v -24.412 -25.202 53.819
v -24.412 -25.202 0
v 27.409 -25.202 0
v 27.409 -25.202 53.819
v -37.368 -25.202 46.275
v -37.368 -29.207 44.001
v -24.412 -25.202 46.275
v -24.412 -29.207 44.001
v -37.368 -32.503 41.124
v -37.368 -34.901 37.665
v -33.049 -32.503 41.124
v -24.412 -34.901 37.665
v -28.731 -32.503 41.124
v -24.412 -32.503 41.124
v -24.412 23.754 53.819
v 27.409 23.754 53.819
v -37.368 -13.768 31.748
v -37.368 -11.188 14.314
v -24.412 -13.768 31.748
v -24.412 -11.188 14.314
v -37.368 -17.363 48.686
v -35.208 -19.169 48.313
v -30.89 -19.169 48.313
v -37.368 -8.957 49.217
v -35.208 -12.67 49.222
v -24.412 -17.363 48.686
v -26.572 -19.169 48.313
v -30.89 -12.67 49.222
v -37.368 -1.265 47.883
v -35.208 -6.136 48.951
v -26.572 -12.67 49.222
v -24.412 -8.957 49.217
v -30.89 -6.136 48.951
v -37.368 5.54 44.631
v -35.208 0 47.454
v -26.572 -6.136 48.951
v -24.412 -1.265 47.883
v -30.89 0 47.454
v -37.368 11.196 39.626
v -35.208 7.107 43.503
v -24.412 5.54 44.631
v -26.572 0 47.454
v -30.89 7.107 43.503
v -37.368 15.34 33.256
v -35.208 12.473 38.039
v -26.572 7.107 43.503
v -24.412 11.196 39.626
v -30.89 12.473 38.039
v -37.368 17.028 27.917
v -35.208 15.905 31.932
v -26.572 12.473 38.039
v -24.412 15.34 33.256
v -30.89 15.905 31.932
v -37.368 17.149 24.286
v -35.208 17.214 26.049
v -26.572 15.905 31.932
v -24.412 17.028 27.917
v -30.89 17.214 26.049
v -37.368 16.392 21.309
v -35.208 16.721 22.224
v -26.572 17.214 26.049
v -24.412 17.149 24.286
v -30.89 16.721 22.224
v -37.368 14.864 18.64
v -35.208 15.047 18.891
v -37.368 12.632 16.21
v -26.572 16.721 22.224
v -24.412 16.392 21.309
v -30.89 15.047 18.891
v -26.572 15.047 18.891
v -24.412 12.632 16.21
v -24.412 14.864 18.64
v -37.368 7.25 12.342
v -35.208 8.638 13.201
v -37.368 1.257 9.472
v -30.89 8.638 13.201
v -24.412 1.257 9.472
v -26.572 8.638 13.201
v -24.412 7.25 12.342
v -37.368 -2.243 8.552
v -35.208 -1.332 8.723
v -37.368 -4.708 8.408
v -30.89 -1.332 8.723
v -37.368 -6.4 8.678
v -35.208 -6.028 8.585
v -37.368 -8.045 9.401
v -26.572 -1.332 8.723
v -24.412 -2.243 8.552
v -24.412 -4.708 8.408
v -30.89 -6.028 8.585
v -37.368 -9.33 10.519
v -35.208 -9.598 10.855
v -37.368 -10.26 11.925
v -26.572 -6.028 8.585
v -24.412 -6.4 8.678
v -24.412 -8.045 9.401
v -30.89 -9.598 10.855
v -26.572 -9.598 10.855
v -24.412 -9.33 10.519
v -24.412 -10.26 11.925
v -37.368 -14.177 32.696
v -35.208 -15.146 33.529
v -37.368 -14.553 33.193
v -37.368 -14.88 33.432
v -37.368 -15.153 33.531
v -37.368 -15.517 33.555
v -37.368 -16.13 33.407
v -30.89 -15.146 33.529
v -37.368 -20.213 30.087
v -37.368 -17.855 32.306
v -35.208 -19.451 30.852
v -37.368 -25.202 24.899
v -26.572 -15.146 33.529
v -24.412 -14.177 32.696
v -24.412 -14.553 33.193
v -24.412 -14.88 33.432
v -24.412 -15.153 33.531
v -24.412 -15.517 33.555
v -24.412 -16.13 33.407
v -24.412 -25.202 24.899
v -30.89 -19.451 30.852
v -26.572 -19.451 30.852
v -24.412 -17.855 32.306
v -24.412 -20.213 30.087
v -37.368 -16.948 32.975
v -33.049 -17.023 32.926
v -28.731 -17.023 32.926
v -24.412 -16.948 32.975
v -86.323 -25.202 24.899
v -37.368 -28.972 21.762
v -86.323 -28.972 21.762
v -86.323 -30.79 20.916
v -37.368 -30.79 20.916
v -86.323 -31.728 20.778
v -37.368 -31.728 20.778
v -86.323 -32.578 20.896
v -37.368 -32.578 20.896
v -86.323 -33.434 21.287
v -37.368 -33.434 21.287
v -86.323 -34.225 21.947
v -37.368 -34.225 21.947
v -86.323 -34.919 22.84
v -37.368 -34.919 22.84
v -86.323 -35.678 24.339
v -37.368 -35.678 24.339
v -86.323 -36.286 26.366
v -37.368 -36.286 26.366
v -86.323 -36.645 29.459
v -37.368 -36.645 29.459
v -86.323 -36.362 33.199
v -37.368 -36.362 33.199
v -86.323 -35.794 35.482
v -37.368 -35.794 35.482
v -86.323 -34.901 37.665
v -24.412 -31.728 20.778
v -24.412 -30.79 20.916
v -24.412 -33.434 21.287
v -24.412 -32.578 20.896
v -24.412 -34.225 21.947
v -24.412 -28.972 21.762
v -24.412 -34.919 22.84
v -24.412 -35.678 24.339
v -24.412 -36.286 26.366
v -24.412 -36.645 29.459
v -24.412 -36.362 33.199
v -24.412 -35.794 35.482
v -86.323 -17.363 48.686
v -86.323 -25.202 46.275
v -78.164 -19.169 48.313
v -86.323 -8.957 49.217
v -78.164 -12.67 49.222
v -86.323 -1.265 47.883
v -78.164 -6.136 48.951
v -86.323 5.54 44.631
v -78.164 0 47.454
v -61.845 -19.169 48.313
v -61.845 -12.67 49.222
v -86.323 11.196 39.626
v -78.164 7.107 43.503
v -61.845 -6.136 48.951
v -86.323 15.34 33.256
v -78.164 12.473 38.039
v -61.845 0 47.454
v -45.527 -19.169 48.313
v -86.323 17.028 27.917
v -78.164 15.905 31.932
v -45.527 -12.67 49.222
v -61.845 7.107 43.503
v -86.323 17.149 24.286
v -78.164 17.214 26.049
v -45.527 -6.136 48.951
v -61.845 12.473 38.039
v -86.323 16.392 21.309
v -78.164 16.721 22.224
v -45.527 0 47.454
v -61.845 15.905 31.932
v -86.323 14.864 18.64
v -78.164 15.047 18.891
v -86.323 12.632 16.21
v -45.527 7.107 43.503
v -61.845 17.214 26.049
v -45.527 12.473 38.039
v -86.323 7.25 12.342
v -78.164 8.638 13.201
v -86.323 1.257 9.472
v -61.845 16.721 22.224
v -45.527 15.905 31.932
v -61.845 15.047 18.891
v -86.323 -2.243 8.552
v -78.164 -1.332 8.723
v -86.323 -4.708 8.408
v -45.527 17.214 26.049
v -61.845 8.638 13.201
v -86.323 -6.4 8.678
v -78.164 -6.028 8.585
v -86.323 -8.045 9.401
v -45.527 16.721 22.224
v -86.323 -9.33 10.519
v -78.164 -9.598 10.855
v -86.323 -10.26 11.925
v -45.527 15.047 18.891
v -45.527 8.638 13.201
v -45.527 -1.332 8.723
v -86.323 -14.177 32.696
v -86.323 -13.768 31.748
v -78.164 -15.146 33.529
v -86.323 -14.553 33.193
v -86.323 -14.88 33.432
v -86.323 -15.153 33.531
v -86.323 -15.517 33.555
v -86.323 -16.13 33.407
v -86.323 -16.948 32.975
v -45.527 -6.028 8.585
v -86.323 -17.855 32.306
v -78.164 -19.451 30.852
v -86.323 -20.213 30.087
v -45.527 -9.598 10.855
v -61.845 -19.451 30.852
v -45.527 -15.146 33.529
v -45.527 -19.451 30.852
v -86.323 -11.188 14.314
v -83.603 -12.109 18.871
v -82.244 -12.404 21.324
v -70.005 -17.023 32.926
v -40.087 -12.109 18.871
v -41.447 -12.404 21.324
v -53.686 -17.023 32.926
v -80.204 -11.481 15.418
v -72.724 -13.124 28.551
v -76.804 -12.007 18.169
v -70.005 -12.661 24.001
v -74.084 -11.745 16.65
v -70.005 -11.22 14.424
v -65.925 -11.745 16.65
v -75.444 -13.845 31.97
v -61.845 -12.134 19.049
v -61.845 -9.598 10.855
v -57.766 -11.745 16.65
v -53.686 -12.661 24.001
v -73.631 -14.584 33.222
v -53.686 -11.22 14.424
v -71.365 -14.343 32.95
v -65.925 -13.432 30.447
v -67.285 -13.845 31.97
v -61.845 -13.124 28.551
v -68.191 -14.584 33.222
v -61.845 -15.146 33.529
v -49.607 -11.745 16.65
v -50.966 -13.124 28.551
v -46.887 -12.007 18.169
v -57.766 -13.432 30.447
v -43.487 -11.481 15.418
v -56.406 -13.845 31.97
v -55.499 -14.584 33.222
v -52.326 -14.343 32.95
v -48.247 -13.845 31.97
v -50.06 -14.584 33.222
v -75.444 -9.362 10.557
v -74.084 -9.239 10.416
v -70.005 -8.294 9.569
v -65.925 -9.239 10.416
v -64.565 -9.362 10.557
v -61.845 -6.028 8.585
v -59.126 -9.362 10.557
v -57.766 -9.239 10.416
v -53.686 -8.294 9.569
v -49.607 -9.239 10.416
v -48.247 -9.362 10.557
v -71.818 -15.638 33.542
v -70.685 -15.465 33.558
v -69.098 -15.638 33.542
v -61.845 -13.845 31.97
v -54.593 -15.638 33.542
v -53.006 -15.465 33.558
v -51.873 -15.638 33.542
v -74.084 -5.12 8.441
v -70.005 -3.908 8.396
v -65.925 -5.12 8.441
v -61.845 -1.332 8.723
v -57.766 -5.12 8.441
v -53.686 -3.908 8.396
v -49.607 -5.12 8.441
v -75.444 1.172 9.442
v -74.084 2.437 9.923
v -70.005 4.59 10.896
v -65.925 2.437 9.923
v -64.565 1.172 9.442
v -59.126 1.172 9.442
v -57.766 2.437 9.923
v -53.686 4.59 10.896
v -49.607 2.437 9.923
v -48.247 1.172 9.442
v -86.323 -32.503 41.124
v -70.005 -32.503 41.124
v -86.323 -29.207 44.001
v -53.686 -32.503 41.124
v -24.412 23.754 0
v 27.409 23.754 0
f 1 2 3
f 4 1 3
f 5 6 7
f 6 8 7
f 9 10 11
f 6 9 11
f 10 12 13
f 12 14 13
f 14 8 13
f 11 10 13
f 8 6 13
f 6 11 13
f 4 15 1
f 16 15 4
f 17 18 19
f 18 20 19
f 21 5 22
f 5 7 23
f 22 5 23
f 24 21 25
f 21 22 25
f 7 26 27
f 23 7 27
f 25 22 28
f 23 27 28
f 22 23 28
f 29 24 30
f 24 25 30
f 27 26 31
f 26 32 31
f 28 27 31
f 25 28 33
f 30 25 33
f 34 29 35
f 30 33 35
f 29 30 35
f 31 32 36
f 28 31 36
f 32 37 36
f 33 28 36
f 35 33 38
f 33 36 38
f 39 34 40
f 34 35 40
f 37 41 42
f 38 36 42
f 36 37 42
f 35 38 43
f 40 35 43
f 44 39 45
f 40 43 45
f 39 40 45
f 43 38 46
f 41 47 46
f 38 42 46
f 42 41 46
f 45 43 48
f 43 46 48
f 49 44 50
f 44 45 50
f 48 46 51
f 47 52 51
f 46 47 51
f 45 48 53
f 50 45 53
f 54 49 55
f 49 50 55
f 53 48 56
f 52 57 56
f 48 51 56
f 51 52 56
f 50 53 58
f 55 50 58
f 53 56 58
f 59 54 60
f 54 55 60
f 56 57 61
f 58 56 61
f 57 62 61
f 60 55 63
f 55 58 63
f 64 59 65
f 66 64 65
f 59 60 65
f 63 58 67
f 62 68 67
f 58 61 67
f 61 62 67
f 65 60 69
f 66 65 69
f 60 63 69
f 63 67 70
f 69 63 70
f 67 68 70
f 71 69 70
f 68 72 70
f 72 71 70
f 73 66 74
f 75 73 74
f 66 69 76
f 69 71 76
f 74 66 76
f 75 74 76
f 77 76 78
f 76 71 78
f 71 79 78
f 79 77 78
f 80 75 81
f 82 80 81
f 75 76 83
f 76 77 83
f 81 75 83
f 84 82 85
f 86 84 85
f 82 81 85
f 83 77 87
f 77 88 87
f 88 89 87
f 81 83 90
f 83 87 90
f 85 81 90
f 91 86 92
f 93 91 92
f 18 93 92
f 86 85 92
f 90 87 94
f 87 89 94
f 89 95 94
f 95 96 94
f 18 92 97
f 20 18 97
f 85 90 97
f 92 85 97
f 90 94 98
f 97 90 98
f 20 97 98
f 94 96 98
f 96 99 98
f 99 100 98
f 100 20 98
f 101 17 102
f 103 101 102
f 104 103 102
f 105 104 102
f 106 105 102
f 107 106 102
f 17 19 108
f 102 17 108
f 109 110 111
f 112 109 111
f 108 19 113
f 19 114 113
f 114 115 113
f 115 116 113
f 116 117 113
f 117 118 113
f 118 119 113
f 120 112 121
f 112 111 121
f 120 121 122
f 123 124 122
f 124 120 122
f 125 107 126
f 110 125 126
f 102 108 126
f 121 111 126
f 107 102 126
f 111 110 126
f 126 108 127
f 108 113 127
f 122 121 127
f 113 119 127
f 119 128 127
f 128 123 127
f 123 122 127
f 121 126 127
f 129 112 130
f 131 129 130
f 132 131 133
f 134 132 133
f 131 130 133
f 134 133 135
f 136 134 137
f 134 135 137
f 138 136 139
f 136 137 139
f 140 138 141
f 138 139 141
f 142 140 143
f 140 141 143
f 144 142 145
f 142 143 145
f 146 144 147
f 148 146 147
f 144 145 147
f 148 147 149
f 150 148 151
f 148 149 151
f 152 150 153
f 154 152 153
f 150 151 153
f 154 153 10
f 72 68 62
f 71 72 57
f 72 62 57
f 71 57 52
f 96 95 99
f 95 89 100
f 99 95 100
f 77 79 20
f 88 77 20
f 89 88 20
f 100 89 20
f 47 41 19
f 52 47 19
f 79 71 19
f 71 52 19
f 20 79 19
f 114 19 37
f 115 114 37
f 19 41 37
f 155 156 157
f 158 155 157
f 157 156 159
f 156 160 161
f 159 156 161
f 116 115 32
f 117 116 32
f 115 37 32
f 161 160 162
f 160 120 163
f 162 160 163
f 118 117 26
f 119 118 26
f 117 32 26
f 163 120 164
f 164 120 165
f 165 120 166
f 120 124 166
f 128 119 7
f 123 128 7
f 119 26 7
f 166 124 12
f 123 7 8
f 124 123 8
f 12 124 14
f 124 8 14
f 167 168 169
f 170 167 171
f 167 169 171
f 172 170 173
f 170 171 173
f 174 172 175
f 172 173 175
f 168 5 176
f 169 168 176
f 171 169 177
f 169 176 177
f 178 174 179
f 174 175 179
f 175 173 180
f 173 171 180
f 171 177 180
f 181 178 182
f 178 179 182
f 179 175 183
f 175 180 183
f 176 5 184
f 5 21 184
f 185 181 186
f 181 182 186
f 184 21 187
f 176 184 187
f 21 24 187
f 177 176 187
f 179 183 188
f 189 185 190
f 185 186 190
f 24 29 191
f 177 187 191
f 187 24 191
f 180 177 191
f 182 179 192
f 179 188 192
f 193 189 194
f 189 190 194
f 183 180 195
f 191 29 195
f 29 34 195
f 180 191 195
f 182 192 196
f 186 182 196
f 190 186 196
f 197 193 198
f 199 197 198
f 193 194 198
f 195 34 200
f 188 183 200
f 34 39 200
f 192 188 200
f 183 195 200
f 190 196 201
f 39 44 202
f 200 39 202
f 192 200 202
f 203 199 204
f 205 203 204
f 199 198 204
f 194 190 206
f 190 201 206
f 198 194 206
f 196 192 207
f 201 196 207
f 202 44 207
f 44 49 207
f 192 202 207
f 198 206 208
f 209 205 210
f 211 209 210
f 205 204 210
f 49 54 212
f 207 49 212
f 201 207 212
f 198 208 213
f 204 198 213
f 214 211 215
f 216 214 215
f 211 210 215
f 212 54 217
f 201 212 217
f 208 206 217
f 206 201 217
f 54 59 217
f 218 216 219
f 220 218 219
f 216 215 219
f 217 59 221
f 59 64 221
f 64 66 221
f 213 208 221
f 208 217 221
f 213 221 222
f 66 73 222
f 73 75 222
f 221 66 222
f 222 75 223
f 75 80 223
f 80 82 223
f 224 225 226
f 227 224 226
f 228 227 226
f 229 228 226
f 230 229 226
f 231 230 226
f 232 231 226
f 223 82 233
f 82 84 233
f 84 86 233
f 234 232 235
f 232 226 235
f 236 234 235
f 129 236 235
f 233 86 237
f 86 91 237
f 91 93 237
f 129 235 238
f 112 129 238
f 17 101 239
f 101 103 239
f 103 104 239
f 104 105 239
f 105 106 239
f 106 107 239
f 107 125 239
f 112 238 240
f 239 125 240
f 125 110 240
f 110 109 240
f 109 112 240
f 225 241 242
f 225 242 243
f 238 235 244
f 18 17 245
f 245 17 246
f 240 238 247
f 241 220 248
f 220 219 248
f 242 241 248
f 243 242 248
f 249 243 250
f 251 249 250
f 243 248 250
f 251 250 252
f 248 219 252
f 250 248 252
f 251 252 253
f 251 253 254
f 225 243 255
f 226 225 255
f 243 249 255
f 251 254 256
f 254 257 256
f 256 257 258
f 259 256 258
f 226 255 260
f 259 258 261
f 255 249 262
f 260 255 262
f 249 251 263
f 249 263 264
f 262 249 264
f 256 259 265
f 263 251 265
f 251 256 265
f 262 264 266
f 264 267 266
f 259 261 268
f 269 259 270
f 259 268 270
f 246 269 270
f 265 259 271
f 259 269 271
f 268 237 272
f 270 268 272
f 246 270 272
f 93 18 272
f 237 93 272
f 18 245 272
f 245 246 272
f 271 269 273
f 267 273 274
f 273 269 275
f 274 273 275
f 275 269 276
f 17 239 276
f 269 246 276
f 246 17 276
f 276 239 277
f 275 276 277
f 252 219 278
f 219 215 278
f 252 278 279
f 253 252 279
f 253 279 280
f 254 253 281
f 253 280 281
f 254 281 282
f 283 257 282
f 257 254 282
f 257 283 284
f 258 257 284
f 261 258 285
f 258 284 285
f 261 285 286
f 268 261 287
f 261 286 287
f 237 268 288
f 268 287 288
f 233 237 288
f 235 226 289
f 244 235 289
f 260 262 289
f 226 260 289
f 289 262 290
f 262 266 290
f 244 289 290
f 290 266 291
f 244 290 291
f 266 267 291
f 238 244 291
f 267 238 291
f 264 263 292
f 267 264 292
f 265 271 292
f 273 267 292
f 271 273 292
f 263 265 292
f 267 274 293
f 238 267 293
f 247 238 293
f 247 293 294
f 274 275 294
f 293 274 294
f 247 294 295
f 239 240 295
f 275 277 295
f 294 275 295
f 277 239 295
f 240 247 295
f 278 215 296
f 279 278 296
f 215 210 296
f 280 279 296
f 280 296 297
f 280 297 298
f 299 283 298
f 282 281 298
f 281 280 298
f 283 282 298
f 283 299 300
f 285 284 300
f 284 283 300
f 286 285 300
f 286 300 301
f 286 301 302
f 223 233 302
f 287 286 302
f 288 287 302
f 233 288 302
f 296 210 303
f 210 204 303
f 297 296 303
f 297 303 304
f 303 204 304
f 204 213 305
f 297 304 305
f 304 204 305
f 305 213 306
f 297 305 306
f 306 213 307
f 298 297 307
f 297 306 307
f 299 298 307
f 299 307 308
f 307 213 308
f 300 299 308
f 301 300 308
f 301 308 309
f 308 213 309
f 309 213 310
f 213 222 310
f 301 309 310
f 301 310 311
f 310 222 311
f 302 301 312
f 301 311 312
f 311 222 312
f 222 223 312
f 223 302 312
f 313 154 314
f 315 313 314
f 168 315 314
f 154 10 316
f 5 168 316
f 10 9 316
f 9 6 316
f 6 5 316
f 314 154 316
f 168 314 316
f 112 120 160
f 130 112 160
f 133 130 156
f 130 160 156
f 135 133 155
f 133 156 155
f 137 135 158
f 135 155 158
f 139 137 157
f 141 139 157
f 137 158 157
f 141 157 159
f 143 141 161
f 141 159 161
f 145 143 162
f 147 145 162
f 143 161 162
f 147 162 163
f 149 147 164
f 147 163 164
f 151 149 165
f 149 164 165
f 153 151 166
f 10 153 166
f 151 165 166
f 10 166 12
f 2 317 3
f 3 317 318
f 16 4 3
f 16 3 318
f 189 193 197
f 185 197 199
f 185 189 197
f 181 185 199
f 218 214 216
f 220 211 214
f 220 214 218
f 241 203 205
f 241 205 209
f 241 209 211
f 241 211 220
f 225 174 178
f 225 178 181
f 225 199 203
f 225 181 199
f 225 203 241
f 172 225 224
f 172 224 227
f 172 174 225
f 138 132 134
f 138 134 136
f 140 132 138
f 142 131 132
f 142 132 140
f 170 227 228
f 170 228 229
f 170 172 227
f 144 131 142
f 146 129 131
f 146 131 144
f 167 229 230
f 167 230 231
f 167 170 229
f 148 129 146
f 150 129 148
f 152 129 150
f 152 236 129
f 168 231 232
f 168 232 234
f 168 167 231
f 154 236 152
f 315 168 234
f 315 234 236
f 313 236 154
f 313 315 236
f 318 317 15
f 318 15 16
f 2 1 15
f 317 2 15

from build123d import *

# Parameters (mm, degrees)
F0_W     = 51.8215708435
F0_H     = 48.9562377334
F1_DEPTH = 53.8191795349
F3_DEPTH = 12.955410406
F4_DEPTH = 48.955399543


with BuildPart() as f1:
    # F0 (on Top) → F1 (new body)
    with BuildSketch(Plane.XY):
        with Locations((1.4984700829, -0.7242448628)):
            Rectangle(F0_W, F0_H)
    extrude(amount=F1_DEPTH)


with BuildPart() as f3:
    # F2 (on face) → F3 (new body)
    with BuildSketch(Plane(origin=(-24.4123153389, 0, 0), x_dir=(0, -1, 0), z_dir=(-1, 0, 0))):
        with BuildLine():
            add(Edge.make_bspline(
                [(25.2023637295, 24.8991206986), (27.4328722263, 22.7130681905), (35.272473577, 16.4203572017), (38.4819320218, 30.5574458081), (34.9008925259, 37.6650169492)],
                knots=[0.8247815937, 0.8247815937, 0.8247815937, 0.8247815937, 0.8743130724, 1, 1, 1, 1], degree=3))
            add(Edge.make_bspline(
                [(34.9008925259, 37.6650169492), (33.0151339497, 41.4078305235), (29.4979390267, 44.3095338115), (25.2023637295, 46.27491442)],
                knots=[0, 0, 0, 0, 0.0661861456, 0.0661861456, 0.0661861456, 0.0661861456], degree=3))
            Line((25.2023637295, 46.27491442), (25.2023637295, 24.8991206986))
        make_face()
        with BuildLine():
            Line((25.2023637295, 24.8991206986), (25.2023637295, 46.27491442))
            add(Edge.make_bspline(
                [(25.2023637295, 46.27491442), (17.6619977554, 49.7249037791), (-5.8575945119, 51.0615692521), (-21.7809004535, 25.6913665566), (-10.523133677, 12.533279507), (15.5552460631, 1.9809499794), (10.5310117353, 42.6018878712), (21.2226517417, 28.7995135394), (25.2023637295, 24.8991206986)],
                knots=[0.0661861456, 0.0661861456, 0.0661861456, 0.0661861456, 0.1823679667, 0.3411227101, 0.4601721444, 0.5900585515, 0.7364066694, 0.8247815937, 0.8247815937, 0.8247815937, 0.8247815937], degree=3))
        make_face()
    extrude(amount=F3_DEPTH)

    # F4 (add): a face of the model
    f4_faces = [f3.faces().sort_by_distance(p)[0] for p in [
        (-37.3677257448, -7.6885673531, 30.8637236045),
    ]]
    extrude(f4_faces, amount=F4_DEPTH)


solid = Compound([f1.part, f3.part])
